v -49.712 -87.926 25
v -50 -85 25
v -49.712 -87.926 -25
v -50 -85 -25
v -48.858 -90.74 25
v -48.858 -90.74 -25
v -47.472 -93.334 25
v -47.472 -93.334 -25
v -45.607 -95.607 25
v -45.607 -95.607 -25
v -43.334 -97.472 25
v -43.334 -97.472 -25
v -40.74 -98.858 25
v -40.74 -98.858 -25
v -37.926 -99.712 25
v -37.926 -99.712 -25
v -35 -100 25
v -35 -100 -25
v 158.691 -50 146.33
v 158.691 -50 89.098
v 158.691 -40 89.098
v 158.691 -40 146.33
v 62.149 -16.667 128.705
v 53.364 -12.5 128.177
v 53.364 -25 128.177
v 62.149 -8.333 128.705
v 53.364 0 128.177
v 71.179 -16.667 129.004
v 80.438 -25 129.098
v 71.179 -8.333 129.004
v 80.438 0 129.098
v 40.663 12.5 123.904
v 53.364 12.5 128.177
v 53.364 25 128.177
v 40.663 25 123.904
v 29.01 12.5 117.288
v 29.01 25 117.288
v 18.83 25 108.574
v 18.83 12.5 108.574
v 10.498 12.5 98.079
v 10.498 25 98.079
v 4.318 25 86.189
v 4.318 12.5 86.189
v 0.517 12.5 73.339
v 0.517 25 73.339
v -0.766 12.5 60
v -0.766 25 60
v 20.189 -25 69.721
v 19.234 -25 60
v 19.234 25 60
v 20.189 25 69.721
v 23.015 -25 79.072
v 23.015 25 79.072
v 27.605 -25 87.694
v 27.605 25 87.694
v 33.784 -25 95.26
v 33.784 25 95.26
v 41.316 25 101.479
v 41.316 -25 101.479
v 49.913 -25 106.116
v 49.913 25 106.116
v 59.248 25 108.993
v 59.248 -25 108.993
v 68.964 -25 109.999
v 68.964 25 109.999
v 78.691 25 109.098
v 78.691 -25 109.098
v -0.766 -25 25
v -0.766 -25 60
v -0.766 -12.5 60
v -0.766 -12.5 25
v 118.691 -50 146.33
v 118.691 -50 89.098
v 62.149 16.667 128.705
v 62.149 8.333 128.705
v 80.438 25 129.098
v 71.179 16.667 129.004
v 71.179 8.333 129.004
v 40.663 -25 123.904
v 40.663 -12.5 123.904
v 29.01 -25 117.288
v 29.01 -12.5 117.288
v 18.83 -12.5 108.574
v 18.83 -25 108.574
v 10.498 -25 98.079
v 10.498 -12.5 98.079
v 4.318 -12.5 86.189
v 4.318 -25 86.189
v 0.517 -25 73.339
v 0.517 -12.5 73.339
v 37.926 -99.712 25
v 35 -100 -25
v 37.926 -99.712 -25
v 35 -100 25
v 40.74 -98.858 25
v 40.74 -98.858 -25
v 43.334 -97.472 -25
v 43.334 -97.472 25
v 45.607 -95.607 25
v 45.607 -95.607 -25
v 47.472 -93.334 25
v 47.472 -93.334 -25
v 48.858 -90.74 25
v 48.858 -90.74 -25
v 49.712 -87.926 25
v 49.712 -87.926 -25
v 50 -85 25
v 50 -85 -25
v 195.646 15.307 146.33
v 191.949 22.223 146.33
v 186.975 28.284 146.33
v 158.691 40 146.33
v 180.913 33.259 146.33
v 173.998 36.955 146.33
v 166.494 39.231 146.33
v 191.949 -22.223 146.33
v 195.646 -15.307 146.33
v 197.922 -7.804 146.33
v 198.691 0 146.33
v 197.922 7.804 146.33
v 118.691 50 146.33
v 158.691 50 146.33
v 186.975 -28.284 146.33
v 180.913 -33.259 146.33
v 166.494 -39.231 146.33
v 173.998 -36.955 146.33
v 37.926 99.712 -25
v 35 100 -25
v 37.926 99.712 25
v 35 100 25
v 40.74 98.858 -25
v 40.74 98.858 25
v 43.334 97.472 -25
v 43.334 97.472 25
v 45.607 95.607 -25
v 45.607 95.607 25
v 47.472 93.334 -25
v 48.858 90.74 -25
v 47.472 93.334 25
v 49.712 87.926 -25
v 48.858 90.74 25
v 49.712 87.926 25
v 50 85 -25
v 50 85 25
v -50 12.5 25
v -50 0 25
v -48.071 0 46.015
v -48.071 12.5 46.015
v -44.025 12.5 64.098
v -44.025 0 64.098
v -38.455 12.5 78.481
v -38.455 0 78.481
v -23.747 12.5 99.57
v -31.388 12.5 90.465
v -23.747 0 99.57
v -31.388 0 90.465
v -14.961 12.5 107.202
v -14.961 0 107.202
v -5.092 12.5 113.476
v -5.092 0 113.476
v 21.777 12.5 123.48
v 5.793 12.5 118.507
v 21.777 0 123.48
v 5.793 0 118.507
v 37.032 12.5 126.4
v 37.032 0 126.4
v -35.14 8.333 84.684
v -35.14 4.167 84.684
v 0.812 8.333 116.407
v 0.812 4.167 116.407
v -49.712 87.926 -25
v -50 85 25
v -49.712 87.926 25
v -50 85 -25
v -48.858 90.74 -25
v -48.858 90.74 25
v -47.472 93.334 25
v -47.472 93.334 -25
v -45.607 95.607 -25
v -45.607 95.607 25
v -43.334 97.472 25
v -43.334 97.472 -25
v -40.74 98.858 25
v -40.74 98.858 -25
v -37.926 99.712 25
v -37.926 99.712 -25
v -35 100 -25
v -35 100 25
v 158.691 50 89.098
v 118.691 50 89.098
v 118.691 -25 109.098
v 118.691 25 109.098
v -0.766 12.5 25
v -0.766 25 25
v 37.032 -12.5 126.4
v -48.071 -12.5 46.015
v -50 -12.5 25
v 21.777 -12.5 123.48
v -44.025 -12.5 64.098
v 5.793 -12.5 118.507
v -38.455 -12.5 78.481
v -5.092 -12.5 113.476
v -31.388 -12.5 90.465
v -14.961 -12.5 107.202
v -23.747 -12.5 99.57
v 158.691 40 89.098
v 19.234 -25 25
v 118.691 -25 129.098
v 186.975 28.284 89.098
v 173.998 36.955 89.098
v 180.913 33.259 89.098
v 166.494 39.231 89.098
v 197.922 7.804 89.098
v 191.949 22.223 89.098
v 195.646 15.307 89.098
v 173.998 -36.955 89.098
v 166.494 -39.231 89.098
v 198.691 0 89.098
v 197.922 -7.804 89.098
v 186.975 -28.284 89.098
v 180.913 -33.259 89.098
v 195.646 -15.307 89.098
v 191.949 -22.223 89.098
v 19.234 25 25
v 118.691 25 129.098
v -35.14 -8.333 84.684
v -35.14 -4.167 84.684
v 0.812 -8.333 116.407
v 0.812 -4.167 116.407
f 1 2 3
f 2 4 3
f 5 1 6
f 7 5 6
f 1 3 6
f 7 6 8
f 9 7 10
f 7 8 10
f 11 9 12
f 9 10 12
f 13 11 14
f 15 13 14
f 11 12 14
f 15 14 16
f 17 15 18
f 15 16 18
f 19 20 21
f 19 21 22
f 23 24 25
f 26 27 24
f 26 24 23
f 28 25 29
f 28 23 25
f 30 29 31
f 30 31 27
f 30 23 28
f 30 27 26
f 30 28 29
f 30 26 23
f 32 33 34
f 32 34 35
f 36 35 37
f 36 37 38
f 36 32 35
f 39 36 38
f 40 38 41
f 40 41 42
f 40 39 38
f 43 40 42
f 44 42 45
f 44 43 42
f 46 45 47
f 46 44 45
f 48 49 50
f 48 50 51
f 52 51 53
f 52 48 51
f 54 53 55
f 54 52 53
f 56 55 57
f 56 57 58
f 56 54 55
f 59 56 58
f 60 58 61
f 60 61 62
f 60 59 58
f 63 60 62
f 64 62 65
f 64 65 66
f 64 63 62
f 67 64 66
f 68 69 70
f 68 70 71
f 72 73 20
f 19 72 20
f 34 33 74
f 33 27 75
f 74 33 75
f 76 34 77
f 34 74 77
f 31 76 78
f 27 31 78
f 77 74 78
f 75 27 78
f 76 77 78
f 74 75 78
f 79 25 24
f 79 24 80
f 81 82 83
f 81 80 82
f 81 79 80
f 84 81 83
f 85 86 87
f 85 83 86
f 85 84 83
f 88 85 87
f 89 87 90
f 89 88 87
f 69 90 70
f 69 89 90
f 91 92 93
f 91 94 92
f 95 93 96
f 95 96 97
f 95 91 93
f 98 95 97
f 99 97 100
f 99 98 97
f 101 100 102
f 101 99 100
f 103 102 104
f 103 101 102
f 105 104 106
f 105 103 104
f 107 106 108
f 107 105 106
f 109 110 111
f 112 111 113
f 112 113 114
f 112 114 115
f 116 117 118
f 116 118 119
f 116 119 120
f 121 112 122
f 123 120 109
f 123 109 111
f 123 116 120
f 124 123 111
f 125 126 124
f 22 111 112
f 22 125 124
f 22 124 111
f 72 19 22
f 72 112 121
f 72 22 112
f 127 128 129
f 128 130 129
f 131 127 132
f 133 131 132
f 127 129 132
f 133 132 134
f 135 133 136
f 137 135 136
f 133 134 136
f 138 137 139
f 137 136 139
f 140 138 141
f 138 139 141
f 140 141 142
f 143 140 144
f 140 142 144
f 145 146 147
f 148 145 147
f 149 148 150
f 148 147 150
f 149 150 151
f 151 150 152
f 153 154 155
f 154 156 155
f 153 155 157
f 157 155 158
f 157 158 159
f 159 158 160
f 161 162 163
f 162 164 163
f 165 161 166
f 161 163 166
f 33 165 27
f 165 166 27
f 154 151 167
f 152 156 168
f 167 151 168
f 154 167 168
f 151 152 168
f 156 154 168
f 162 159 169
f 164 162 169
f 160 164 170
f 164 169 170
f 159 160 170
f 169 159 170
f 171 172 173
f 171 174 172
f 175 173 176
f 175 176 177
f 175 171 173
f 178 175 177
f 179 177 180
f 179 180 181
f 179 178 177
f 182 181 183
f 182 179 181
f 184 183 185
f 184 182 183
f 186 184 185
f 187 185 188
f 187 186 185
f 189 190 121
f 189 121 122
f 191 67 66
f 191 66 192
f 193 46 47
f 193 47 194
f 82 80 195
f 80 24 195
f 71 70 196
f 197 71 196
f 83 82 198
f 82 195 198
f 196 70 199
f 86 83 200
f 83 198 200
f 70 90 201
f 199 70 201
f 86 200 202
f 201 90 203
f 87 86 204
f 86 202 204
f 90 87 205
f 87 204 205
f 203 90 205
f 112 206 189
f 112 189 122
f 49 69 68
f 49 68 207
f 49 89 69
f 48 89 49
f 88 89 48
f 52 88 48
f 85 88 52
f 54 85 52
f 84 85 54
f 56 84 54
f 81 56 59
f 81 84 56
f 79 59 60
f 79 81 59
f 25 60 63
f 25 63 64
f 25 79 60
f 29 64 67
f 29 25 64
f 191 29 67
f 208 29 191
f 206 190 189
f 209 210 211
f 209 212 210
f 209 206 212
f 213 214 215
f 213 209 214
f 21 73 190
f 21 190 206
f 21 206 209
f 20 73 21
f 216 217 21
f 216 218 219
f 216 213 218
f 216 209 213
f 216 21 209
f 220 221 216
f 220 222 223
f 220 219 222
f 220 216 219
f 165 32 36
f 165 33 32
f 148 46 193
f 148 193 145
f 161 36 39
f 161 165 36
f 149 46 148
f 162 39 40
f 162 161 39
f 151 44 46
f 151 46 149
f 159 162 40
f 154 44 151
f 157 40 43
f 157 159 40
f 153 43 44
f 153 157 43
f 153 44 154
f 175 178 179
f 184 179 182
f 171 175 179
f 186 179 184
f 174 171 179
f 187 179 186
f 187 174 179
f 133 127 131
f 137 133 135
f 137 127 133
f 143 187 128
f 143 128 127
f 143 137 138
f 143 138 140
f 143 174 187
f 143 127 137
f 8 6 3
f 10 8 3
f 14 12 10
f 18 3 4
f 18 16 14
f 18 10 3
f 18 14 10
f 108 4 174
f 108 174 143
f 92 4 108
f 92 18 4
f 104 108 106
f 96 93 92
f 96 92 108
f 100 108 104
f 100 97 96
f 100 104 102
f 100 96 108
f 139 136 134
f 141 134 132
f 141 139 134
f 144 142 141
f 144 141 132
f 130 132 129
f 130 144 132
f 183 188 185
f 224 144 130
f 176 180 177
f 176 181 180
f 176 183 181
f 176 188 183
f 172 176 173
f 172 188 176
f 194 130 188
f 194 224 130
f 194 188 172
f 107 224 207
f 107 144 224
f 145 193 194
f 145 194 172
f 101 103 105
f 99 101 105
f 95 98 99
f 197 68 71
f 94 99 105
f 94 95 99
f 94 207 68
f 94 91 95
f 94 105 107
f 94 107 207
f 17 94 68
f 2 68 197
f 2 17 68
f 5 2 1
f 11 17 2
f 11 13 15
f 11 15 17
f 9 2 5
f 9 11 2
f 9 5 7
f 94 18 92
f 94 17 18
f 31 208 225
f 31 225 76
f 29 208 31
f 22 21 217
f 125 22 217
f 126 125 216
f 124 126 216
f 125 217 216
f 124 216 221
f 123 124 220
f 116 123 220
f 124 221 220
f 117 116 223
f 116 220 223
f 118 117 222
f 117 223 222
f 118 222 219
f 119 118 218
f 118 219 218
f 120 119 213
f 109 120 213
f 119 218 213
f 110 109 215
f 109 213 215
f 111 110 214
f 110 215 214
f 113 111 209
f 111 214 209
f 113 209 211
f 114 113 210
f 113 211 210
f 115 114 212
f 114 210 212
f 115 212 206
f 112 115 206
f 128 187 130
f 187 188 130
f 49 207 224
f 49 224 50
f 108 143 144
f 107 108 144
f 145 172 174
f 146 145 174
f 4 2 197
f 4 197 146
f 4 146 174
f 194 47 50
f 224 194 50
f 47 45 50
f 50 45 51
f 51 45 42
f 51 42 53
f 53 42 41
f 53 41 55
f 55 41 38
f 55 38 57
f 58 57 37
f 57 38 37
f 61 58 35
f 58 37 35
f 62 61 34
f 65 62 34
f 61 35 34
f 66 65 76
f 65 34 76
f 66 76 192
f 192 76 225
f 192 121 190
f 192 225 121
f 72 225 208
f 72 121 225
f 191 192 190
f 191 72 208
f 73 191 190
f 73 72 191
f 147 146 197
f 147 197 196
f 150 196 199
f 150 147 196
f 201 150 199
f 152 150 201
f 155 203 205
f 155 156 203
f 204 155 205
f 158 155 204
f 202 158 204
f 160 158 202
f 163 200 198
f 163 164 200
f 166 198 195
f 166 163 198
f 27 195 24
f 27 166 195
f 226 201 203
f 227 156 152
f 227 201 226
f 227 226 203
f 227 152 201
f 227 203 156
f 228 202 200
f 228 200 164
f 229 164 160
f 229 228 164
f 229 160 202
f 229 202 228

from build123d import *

# Parameters (mm, degrees)
F1_DEPTH = 100
F2_DEPTH = 25
F3_DEPTH = 50
F5_DEPTH = 12.5
F6_R     = 15


with BuildPart() as f1:
    # F0 (on Front) → F1 (new body, symmetric)
    with BuildSketch(Plane.XZ):
        Polygon((-50, 25), (-50, -25), (50, -25), (50, 25), (19.234454, 25), (-0.765546, 25), align=None)
    extrude(amount=F1_DEPTH, both=True)

    # F0 (on Front) → F2 (join, symmetric)
    with BuildSketch(Plane.XZ):
        with BuildLine():
            Line((-0.765546, 60), (-0.765546, 25))
            Line((-0.765546, 25), (19.234454, 25))
            Line((19.234454, 25), (19.234454, 60))
            ThreePointArc((19.234454, 60), (37.397461, 98.553935), (78.690689, 109.097654))
            Line((78.690689, 109.097654), (118.690689, 109.097654))
            Line((118.690689, 109.097654), (118.690689, 129.097654))
            Line((118.690689, 129.097654), (80.437767, 129.097654))
            add(Edge.make_bspline(
                [(53.363976, 128.17718), (62.022985, 128.828118), (71.068506, 129.097654), (80.437767, 129.097654)],
                knots=[145.637672, 145.637672, 145.637672, 145.637672, 166.884189, 166.884189, 166.884189, 166.884189], degree=3))
            ThreePointArc((53.363976, 128.17718), (14.412316, 103.526237), (-0.765546, 60))
        make_face()
    extrude(amount=F2_DEPTH, both=True)

    # F0 (on Front) → F3 (join, symmetric)
    with BuildSketch(Plane.XZ):
        Polygon((118.690689, 146.330218), (118.690689, 129.097654), (118.690689, 109.097654), (118.690689, 89.097654), (158.690689, 89.097654), (158.690689, 146.330218), align=None)
    extrude(amount=F3_DEPTH, both=True)

    # F0 (on Front) → F4 (revolve)
    with BuildSketch(Plane.XZ):
        Polygon((118.690689, 146.330218), (118.690689, 129.097654), (118.690689, 109.097654), (118.690689, 89.097654), (158.690689, 89.097654), (158.690689, 146.330218), align=None)
    revolve(axis=Axis((158.690689, 0, 117.713936), (0, 0, 1)))

    # F0 (on Front) → F5 (join, symmetric)
    with BuildSketch(Plane.XZ):
        with BuildLine():
            add(Edge.make_bspline(
                [(-50, 25), (-47.184367, 101.332585), (-5.990596, 123.715224), (53.363976, 128.17718)],
                knots=[0, 0, 0, 0, 145.637672, 145.637672, 145.637672, 145.637672], degree=3))
            Line((-50, 25), (-0.765546, 25))
            Line((-0.765546, 25), (-0.765546, 60))
            ThreePointArc((-0.765546, 60), (14.412316, 103.526237), (53.363976, 128.17718))
        make_face()
    extrude(amount=F5_DEPTH, both=True)

    # F6
    f6_edges = [f1.edges().sort_by_distance(p)[0] for p in [
        (-50, -100, 0),
        (50, -100, 0),
        (50, 100, 0),
        (-50, 100, 0),
    ]]
    fillet(f6_edges, radius=F6_R)


solid = f1.part
